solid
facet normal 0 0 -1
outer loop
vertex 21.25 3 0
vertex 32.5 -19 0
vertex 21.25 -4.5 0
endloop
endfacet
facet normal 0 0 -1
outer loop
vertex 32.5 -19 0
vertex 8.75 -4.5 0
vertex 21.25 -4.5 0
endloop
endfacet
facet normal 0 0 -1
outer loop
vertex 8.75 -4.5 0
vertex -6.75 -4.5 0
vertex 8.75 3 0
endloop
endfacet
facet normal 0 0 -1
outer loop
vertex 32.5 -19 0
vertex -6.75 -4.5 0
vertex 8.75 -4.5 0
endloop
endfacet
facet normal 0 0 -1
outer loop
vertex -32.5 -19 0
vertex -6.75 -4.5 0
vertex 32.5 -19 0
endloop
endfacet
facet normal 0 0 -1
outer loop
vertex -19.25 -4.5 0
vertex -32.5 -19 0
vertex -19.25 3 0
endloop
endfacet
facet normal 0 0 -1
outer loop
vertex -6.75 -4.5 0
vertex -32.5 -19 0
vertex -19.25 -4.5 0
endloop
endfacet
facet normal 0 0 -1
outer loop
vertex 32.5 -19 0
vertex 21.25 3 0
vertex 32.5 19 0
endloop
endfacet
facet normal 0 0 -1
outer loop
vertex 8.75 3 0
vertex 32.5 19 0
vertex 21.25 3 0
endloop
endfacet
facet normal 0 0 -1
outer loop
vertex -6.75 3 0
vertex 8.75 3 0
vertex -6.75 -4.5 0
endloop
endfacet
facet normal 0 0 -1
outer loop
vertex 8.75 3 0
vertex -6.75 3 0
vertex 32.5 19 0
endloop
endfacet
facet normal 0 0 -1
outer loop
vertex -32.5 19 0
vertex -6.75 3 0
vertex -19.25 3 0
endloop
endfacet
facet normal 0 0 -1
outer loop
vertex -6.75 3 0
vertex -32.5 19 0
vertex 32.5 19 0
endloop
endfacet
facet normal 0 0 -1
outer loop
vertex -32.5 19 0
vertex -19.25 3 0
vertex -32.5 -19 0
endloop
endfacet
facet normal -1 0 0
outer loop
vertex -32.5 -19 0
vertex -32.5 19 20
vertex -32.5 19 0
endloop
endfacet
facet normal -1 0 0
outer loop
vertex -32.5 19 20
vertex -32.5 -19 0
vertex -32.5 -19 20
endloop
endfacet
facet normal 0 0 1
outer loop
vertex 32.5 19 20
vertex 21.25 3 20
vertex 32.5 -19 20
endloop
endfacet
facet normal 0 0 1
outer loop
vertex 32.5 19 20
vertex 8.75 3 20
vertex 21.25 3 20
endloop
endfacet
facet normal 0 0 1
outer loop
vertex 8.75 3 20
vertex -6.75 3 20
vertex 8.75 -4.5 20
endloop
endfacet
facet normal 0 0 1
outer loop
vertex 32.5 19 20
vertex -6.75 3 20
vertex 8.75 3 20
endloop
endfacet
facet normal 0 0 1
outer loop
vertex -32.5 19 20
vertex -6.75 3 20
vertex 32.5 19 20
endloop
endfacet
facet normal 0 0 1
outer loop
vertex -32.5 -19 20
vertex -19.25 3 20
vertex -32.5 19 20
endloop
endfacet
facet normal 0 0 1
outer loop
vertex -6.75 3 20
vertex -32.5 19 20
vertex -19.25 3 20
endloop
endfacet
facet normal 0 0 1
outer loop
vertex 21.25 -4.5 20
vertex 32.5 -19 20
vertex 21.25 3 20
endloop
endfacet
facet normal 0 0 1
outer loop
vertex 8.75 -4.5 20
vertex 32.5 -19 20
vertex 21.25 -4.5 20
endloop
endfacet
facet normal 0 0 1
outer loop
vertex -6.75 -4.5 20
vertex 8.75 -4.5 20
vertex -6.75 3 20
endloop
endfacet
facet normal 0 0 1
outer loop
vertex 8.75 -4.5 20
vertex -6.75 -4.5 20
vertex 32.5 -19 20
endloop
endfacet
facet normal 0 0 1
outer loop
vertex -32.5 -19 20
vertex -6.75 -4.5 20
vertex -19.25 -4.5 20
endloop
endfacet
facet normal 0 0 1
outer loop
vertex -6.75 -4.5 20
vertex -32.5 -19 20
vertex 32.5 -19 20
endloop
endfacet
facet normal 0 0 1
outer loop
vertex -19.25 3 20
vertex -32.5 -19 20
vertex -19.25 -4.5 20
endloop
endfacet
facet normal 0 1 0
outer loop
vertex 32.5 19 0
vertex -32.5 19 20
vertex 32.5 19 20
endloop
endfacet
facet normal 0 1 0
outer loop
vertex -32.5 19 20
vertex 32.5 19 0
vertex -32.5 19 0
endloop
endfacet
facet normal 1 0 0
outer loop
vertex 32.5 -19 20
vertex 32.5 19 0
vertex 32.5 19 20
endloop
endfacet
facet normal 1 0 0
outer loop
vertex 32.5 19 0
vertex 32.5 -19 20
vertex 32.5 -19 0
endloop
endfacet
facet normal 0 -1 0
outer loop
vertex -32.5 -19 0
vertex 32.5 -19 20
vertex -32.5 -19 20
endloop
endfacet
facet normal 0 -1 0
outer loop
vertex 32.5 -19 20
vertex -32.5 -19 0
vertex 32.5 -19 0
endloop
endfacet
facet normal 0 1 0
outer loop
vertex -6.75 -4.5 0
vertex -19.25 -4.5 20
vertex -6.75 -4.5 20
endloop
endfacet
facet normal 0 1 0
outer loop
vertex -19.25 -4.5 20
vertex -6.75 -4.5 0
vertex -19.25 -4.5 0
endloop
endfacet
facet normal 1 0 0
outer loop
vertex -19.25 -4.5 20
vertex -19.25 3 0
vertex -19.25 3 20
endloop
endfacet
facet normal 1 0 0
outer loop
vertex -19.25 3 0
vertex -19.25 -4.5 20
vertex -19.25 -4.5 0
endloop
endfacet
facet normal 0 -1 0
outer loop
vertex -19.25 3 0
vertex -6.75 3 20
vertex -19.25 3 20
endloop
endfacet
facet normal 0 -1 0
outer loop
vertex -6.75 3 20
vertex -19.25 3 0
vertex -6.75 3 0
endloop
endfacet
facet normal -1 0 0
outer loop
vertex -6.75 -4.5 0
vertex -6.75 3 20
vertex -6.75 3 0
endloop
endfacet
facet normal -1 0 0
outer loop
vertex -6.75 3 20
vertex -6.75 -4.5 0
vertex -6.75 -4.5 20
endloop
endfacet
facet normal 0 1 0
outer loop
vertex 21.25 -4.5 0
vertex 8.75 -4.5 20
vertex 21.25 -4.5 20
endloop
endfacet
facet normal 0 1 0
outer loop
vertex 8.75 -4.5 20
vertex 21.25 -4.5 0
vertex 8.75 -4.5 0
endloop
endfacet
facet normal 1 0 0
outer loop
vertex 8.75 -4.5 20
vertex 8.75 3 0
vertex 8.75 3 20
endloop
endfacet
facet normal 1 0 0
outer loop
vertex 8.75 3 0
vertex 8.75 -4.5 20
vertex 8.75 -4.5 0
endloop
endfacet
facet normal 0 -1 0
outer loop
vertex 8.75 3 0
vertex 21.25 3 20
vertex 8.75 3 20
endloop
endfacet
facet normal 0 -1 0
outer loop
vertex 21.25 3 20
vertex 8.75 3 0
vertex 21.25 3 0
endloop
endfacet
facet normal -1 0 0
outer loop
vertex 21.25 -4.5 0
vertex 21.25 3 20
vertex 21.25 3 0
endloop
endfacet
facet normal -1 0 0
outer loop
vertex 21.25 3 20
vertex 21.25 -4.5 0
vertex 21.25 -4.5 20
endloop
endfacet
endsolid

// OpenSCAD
// file: config.scad
HEX_WIDTH= 125;
HEX_BORDER = 7;
HEX_HEIGHT = 38;
HEX_ARM = HEX_WIDTH / 6;
SHIELD_THICKNESS = 3;
SHIELD_DIFFUSER_PADDING = 3.4;

SNAPFIT_DEPTH = 12.5;
SNAPFIT_HEIGHT = 7.5;
// main file
include <config.scad>;

BASE = 15;
HEIGHT = 20;

module snapfit_xtor() {
    hole_width = SNAPFIT_DEPTH;
    hole_height = SNAPFIT_HEIGHT;
    dist_y = 3;
    
    rotate([270,0,0])
    translate([-(25-12), 0, dist_y - hole_height])
    union() {
        linear_extrude(hole_height)
        square([hole_width, 200], center=true);
    }
}

difference() {
    linear_extrude(20)
    square([65,38], center=true);



    snapfit_xtor();

    translate([28,0,0])
    snapfit_xtor();
}
